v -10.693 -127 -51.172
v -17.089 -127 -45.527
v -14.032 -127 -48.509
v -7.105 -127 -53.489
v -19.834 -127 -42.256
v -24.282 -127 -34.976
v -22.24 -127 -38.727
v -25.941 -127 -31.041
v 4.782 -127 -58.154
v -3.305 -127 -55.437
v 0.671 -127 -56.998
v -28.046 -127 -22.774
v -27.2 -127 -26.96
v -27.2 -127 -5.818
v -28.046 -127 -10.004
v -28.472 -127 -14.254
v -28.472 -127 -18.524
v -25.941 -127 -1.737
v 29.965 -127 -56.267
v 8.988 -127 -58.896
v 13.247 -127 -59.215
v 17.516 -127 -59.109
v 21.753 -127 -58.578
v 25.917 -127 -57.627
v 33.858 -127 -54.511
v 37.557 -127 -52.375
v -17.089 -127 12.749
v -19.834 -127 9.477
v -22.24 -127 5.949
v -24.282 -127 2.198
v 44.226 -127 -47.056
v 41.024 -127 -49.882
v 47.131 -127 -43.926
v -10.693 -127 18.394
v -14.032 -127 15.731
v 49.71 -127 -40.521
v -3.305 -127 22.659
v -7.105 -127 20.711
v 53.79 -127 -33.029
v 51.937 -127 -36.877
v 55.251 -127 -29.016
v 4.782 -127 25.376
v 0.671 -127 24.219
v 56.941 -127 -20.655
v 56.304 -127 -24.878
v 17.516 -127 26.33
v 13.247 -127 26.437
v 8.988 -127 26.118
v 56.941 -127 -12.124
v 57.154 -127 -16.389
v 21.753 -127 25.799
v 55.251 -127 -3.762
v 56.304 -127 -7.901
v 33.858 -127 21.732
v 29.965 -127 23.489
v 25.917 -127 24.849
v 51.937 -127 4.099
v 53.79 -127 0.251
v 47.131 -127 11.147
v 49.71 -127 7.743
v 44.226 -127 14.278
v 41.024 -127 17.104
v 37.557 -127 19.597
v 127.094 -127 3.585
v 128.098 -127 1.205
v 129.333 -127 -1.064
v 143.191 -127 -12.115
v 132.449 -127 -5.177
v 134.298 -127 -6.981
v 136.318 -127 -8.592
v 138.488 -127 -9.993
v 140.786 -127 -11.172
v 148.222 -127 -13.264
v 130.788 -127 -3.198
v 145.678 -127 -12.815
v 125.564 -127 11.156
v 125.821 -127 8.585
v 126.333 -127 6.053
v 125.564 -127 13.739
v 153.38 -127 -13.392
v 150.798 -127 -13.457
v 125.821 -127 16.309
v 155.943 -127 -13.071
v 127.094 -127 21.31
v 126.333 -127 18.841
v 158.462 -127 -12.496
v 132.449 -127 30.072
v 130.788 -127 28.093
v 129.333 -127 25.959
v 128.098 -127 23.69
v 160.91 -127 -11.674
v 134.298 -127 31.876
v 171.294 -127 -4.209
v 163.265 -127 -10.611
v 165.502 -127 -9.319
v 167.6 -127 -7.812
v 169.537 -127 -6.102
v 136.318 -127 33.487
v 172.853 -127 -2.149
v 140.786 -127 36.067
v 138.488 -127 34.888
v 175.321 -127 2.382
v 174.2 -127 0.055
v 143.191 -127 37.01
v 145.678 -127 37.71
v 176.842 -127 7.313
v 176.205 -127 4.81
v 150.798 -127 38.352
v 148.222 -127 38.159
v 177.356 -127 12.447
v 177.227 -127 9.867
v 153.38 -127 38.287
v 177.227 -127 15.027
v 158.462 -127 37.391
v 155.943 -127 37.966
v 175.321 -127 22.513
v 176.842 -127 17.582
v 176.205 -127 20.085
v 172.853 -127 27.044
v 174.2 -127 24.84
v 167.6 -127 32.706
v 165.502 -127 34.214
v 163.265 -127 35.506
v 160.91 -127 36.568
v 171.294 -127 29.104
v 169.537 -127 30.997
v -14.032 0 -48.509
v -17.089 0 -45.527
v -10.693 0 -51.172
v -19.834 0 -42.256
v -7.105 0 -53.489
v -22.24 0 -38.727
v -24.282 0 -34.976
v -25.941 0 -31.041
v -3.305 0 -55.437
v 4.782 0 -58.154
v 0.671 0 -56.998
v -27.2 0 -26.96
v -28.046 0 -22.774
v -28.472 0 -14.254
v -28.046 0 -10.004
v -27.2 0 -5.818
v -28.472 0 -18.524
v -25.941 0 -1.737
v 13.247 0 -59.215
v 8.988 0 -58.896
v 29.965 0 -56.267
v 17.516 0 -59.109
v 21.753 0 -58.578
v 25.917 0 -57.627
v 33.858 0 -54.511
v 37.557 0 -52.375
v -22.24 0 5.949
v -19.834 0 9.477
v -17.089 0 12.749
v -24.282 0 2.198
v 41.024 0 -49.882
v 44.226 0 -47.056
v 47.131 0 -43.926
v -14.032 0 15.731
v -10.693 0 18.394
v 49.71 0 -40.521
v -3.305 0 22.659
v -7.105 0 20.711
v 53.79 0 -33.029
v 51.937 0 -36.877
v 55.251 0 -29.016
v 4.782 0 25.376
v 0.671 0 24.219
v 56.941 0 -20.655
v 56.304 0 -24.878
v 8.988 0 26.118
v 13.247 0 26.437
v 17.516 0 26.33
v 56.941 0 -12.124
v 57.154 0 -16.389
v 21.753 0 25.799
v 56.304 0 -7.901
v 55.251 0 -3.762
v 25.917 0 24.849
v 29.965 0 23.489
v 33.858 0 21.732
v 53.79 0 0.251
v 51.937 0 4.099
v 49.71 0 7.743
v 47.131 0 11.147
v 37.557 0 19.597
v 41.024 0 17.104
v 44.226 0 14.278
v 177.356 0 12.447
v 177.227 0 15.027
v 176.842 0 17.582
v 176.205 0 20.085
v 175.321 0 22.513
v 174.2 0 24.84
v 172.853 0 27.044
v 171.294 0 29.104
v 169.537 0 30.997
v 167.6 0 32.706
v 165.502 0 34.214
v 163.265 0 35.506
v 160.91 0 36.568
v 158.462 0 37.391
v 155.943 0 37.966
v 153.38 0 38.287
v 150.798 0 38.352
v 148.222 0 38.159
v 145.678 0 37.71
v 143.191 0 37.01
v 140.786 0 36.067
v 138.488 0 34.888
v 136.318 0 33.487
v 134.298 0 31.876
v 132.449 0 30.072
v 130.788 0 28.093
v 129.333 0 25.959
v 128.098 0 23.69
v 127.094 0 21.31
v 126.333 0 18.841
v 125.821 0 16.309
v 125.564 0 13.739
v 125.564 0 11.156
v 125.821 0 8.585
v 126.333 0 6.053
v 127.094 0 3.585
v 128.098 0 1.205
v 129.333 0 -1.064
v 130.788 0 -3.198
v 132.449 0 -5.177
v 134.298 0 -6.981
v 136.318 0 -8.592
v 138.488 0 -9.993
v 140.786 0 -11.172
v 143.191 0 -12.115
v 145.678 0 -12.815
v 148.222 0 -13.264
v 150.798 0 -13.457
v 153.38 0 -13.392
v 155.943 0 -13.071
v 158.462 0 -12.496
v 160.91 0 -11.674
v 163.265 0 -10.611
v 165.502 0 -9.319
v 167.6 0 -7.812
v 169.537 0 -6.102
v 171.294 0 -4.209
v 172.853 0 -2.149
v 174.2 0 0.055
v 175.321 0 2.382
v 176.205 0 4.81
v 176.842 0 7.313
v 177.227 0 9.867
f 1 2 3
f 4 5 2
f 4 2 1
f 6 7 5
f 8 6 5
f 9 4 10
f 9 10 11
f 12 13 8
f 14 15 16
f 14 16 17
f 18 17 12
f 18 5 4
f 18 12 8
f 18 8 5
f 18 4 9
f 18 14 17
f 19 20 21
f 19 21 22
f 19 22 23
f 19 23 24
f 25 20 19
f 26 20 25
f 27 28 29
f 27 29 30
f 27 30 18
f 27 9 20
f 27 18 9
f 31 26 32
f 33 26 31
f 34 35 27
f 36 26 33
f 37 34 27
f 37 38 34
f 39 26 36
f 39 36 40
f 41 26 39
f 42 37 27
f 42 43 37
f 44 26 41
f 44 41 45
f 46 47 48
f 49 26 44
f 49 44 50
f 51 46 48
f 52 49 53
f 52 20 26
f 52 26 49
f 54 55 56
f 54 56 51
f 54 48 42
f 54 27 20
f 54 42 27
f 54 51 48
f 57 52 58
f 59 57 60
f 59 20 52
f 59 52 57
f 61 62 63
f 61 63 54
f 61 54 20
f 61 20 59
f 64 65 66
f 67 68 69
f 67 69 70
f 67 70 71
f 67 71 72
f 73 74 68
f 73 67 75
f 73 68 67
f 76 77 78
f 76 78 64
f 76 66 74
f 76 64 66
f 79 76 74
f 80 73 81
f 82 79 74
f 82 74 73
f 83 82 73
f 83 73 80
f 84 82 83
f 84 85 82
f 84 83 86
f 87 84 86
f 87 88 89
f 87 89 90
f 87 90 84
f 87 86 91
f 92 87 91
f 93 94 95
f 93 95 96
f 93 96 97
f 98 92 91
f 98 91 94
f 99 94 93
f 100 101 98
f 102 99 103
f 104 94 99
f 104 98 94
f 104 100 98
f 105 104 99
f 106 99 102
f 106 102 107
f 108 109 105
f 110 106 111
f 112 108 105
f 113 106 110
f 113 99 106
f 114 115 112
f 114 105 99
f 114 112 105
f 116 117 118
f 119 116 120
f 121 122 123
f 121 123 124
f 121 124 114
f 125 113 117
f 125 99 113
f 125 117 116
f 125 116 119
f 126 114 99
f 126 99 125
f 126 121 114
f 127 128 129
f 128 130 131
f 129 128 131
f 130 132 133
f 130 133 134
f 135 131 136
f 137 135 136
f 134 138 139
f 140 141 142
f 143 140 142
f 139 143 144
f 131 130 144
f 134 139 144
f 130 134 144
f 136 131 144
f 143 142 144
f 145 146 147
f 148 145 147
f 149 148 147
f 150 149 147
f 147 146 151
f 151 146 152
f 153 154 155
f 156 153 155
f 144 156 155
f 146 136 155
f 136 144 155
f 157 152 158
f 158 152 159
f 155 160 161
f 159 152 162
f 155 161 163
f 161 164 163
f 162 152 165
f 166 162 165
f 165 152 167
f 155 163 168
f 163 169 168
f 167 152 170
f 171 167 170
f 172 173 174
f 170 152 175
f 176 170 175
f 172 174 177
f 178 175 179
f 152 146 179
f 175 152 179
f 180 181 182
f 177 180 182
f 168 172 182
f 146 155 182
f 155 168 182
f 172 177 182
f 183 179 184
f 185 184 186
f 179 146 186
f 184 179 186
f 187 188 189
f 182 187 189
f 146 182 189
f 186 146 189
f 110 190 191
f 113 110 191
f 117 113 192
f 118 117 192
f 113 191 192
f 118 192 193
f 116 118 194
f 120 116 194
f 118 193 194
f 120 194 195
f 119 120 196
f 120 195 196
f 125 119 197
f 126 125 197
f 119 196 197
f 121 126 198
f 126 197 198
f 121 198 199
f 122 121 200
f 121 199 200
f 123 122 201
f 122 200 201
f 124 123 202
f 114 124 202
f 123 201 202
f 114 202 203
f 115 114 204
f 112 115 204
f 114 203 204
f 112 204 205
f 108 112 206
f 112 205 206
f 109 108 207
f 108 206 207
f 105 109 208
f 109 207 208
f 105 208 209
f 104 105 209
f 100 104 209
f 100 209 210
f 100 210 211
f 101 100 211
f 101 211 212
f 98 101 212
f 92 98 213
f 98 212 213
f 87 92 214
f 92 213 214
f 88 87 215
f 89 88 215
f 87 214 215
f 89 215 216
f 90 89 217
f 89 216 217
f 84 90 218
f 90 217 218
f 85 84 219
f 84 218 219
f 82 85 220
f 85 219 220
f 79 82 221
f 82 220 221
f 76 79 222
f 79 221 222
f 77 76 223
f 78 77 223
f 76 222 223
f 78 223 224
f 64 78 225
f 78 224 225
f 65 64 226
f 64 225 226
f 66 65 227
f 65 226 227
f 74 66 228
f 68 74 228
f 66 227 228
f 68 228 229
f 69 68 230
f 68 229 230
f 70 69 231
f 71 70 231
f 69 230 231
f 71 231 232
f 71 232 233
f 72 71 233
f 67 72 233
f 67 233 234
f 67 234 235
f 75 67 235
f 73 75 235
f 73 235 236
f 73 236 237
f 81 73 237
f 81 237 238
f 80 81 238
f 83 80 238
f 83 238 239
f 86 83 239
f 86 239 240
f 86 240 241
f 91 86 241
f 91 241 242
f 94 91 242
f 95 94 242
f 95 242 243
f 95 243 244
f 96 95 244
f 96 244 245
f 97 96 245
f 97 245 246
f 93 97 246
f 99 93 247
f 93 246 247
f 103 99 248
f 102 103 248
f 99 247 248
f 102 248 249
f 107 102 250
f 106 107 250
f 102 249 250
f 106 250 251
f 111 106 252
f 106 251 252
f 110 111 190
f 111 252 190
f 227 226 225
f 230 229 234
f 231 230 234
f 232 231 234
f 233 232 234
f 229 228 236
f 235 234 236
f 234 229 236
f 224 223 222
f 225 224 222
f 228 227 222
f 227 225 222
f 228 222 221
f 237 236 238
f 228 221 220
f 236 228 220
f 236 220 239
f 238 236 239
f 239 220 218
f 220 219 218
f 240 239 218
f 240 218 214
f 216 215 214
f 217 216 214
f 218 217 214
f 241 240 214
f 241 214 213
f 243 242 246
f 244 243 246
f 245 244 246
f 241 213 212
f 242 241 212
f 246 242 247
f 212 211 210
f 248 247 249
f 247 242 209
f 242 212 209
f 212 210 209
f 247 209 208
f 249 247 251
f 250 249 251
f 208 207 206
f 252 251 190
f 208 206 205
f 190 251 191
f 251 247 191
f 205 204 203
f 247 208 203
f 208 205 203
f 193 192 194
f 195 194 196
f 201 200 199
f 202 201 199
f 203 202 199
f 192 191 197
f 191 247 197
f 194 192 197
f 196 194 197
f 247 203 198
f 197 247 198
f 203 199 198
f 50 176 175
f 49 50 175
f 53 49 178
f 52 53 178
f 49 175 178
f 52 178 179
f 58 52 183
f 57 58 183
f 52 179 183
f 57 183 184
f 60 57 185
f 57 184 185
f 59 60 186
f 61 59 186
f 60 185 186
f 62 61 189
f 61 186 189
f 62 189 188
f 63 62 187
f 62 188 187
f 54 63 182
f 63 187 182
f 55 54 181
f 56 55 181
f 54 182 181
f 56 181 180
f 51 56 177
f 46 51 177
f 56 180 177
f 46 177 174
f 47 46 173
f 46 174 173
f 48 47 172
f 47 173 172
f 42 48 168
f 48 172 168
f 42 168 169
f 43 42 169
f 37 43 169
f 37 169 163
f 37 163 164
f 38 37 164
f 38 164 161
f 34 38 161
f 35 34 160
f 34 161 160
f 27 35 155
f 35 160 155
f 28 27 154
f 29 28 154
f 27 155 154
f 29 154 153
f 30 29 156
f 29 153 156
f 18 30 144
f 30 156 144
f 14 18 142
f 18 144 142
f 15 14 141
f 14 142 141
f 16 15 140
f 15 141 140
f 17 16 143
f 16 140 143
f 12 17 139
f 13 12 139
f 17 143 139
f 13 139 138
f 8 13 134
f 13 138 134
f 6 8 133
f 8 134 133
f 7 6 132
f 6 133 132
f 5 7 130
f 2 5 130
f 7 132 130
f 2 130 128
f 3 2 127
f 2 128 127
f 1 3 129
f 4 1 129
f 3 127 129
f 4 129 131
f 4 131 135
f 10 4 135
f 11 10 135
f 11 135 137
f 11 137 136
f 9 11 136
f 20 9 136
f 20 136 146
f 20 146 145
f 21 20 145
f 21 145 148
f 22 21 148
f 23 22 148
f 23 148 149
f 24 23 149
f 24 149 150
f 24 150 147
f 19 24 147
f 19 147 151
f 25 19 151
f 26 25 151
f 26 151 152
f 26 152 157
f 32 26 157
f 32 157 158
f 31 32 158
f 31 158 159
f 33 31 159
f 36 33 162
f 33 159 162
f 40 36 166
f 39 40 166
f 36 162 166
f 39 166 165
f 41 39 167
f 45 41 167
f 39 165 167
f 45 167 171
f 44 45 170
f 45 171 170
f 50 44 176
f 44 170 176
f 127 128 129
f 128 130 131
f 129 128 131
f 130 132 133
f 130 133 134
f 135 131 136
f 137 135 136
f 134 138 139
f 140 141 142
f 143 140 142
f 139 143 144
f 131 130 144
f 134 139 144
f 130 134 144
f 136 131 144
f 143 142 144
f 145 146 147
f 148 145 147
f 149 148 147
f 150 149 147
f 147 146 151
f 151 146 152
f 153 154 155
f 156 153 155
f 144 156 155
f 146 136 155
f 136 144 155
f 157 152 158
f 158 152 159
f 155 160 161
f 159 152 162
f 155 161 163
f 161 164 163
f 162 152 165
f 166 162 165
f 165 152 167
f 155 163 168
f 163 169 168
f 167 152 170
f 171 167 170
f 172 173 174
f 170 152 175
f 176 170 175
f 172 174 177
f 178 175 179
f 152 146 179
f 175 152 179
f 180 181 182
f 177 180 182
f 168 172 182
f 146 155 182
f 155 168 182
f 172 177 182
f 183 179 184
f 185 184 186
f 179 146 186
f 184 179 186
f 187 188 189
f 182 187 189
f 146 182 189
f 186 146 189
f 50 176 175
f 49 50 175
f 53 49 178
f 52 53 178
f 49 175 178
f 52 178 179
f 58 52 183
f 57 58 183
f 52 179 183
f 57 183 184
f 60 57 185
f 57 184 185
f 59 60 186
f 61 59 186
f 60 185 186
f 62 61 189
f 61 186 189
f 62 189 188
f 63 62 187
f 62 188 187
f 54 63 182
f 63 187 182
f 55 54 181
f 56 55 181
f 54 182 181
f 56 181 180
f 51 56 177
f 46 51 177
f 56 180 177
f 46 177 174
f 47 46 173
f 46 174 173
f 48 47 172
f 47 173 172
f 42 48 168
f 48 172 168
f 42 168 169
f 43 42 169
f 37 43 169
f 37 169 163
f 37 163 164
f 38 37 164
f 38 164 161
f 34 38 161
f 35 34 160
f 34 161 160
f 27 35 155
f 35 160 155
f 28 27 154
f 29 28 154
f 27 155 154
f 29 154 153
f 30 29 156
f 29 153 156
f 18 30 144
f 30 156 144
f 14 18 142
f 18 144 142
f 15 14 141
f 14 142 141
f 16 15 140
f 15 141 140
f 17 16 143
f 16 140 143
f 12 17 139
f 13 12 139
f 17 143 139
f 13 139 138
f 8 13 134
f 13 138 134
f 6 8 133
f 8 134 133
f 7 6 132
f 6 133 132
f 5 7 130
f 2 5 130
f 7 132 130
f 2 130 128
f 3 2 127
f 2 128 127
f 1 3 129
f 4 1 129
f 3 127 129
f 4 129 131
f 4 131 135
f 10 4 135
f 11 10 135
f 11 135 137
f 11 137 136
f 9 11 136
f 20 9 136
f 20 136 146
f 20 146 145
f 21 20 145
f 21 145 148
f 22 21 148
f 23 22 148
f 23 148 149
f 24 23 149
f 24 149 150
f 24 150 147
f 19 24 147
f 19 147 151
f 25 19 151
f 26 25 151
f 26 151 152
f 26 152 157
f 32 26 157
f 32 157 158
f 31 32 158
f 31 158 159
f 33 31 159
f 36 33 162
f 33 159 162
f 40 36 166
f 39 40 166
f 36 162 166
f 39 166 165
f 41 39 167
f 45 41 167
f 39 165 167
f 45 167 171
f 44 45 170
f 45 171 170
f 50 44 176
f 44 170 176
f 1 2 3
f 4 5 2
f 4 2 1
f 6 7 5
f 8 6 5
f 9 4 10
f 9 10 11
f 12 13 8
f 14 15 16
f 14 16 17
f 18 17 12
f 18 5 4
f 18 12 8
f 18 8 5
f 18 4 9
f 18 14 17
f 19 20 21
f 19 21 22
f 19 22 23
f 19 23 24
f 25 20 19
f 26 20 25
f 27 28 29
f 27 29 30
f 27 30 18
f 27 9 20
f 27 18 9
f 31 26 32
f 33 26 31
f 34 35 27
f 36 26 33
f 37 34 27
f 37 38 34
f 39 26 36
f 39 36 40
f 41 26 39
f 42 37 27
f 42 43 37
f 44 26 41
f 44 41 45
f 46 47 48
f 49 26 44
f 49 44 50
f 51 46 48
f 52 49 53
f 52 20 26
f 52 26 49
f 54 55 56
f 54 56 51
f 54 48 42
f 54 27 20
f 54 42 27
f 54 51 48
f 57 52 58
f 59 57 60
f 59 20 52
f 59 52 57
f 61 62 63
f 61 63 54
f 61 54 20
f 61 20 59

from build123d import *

# Parameters (mm, degrees)
F1_R     = 25.9122273215
F3_DEPTH = 127
F0_R     = 42.8392758179
F2_R     = 42.8392758179


with BuildPart() as f3:
    # F1 (on Front) → F3 (new body)
    with BuildSketch(Plane.XZ):
        with Locations((151.4436900616, 12.4474465847)):
            Circle(F1_R)
    extrude(amount=F3_DEPTH)


with BuildPart() as f3b:
    # F0 (on Front) → F3, piece 2 (new body)
    with BuildSketch(Plane.XZ):
        with Locations((14.3145173788, -16.3891017437)):
            Circle(F0_R)
    extrude(amount=F3_DEPTH)


with BuildPart() as f3c:
    # F2 (on face) → F3, piece 3 (new body)
    with BuildSketch(Plane.XZ):
        with Locations((14.3145173788, -16.3891017437)):
            Circle(F2_R)
    extrude(amount=F3_DEPTH)


solid = Compound([f3.part, f3b.part, f3c.part])
